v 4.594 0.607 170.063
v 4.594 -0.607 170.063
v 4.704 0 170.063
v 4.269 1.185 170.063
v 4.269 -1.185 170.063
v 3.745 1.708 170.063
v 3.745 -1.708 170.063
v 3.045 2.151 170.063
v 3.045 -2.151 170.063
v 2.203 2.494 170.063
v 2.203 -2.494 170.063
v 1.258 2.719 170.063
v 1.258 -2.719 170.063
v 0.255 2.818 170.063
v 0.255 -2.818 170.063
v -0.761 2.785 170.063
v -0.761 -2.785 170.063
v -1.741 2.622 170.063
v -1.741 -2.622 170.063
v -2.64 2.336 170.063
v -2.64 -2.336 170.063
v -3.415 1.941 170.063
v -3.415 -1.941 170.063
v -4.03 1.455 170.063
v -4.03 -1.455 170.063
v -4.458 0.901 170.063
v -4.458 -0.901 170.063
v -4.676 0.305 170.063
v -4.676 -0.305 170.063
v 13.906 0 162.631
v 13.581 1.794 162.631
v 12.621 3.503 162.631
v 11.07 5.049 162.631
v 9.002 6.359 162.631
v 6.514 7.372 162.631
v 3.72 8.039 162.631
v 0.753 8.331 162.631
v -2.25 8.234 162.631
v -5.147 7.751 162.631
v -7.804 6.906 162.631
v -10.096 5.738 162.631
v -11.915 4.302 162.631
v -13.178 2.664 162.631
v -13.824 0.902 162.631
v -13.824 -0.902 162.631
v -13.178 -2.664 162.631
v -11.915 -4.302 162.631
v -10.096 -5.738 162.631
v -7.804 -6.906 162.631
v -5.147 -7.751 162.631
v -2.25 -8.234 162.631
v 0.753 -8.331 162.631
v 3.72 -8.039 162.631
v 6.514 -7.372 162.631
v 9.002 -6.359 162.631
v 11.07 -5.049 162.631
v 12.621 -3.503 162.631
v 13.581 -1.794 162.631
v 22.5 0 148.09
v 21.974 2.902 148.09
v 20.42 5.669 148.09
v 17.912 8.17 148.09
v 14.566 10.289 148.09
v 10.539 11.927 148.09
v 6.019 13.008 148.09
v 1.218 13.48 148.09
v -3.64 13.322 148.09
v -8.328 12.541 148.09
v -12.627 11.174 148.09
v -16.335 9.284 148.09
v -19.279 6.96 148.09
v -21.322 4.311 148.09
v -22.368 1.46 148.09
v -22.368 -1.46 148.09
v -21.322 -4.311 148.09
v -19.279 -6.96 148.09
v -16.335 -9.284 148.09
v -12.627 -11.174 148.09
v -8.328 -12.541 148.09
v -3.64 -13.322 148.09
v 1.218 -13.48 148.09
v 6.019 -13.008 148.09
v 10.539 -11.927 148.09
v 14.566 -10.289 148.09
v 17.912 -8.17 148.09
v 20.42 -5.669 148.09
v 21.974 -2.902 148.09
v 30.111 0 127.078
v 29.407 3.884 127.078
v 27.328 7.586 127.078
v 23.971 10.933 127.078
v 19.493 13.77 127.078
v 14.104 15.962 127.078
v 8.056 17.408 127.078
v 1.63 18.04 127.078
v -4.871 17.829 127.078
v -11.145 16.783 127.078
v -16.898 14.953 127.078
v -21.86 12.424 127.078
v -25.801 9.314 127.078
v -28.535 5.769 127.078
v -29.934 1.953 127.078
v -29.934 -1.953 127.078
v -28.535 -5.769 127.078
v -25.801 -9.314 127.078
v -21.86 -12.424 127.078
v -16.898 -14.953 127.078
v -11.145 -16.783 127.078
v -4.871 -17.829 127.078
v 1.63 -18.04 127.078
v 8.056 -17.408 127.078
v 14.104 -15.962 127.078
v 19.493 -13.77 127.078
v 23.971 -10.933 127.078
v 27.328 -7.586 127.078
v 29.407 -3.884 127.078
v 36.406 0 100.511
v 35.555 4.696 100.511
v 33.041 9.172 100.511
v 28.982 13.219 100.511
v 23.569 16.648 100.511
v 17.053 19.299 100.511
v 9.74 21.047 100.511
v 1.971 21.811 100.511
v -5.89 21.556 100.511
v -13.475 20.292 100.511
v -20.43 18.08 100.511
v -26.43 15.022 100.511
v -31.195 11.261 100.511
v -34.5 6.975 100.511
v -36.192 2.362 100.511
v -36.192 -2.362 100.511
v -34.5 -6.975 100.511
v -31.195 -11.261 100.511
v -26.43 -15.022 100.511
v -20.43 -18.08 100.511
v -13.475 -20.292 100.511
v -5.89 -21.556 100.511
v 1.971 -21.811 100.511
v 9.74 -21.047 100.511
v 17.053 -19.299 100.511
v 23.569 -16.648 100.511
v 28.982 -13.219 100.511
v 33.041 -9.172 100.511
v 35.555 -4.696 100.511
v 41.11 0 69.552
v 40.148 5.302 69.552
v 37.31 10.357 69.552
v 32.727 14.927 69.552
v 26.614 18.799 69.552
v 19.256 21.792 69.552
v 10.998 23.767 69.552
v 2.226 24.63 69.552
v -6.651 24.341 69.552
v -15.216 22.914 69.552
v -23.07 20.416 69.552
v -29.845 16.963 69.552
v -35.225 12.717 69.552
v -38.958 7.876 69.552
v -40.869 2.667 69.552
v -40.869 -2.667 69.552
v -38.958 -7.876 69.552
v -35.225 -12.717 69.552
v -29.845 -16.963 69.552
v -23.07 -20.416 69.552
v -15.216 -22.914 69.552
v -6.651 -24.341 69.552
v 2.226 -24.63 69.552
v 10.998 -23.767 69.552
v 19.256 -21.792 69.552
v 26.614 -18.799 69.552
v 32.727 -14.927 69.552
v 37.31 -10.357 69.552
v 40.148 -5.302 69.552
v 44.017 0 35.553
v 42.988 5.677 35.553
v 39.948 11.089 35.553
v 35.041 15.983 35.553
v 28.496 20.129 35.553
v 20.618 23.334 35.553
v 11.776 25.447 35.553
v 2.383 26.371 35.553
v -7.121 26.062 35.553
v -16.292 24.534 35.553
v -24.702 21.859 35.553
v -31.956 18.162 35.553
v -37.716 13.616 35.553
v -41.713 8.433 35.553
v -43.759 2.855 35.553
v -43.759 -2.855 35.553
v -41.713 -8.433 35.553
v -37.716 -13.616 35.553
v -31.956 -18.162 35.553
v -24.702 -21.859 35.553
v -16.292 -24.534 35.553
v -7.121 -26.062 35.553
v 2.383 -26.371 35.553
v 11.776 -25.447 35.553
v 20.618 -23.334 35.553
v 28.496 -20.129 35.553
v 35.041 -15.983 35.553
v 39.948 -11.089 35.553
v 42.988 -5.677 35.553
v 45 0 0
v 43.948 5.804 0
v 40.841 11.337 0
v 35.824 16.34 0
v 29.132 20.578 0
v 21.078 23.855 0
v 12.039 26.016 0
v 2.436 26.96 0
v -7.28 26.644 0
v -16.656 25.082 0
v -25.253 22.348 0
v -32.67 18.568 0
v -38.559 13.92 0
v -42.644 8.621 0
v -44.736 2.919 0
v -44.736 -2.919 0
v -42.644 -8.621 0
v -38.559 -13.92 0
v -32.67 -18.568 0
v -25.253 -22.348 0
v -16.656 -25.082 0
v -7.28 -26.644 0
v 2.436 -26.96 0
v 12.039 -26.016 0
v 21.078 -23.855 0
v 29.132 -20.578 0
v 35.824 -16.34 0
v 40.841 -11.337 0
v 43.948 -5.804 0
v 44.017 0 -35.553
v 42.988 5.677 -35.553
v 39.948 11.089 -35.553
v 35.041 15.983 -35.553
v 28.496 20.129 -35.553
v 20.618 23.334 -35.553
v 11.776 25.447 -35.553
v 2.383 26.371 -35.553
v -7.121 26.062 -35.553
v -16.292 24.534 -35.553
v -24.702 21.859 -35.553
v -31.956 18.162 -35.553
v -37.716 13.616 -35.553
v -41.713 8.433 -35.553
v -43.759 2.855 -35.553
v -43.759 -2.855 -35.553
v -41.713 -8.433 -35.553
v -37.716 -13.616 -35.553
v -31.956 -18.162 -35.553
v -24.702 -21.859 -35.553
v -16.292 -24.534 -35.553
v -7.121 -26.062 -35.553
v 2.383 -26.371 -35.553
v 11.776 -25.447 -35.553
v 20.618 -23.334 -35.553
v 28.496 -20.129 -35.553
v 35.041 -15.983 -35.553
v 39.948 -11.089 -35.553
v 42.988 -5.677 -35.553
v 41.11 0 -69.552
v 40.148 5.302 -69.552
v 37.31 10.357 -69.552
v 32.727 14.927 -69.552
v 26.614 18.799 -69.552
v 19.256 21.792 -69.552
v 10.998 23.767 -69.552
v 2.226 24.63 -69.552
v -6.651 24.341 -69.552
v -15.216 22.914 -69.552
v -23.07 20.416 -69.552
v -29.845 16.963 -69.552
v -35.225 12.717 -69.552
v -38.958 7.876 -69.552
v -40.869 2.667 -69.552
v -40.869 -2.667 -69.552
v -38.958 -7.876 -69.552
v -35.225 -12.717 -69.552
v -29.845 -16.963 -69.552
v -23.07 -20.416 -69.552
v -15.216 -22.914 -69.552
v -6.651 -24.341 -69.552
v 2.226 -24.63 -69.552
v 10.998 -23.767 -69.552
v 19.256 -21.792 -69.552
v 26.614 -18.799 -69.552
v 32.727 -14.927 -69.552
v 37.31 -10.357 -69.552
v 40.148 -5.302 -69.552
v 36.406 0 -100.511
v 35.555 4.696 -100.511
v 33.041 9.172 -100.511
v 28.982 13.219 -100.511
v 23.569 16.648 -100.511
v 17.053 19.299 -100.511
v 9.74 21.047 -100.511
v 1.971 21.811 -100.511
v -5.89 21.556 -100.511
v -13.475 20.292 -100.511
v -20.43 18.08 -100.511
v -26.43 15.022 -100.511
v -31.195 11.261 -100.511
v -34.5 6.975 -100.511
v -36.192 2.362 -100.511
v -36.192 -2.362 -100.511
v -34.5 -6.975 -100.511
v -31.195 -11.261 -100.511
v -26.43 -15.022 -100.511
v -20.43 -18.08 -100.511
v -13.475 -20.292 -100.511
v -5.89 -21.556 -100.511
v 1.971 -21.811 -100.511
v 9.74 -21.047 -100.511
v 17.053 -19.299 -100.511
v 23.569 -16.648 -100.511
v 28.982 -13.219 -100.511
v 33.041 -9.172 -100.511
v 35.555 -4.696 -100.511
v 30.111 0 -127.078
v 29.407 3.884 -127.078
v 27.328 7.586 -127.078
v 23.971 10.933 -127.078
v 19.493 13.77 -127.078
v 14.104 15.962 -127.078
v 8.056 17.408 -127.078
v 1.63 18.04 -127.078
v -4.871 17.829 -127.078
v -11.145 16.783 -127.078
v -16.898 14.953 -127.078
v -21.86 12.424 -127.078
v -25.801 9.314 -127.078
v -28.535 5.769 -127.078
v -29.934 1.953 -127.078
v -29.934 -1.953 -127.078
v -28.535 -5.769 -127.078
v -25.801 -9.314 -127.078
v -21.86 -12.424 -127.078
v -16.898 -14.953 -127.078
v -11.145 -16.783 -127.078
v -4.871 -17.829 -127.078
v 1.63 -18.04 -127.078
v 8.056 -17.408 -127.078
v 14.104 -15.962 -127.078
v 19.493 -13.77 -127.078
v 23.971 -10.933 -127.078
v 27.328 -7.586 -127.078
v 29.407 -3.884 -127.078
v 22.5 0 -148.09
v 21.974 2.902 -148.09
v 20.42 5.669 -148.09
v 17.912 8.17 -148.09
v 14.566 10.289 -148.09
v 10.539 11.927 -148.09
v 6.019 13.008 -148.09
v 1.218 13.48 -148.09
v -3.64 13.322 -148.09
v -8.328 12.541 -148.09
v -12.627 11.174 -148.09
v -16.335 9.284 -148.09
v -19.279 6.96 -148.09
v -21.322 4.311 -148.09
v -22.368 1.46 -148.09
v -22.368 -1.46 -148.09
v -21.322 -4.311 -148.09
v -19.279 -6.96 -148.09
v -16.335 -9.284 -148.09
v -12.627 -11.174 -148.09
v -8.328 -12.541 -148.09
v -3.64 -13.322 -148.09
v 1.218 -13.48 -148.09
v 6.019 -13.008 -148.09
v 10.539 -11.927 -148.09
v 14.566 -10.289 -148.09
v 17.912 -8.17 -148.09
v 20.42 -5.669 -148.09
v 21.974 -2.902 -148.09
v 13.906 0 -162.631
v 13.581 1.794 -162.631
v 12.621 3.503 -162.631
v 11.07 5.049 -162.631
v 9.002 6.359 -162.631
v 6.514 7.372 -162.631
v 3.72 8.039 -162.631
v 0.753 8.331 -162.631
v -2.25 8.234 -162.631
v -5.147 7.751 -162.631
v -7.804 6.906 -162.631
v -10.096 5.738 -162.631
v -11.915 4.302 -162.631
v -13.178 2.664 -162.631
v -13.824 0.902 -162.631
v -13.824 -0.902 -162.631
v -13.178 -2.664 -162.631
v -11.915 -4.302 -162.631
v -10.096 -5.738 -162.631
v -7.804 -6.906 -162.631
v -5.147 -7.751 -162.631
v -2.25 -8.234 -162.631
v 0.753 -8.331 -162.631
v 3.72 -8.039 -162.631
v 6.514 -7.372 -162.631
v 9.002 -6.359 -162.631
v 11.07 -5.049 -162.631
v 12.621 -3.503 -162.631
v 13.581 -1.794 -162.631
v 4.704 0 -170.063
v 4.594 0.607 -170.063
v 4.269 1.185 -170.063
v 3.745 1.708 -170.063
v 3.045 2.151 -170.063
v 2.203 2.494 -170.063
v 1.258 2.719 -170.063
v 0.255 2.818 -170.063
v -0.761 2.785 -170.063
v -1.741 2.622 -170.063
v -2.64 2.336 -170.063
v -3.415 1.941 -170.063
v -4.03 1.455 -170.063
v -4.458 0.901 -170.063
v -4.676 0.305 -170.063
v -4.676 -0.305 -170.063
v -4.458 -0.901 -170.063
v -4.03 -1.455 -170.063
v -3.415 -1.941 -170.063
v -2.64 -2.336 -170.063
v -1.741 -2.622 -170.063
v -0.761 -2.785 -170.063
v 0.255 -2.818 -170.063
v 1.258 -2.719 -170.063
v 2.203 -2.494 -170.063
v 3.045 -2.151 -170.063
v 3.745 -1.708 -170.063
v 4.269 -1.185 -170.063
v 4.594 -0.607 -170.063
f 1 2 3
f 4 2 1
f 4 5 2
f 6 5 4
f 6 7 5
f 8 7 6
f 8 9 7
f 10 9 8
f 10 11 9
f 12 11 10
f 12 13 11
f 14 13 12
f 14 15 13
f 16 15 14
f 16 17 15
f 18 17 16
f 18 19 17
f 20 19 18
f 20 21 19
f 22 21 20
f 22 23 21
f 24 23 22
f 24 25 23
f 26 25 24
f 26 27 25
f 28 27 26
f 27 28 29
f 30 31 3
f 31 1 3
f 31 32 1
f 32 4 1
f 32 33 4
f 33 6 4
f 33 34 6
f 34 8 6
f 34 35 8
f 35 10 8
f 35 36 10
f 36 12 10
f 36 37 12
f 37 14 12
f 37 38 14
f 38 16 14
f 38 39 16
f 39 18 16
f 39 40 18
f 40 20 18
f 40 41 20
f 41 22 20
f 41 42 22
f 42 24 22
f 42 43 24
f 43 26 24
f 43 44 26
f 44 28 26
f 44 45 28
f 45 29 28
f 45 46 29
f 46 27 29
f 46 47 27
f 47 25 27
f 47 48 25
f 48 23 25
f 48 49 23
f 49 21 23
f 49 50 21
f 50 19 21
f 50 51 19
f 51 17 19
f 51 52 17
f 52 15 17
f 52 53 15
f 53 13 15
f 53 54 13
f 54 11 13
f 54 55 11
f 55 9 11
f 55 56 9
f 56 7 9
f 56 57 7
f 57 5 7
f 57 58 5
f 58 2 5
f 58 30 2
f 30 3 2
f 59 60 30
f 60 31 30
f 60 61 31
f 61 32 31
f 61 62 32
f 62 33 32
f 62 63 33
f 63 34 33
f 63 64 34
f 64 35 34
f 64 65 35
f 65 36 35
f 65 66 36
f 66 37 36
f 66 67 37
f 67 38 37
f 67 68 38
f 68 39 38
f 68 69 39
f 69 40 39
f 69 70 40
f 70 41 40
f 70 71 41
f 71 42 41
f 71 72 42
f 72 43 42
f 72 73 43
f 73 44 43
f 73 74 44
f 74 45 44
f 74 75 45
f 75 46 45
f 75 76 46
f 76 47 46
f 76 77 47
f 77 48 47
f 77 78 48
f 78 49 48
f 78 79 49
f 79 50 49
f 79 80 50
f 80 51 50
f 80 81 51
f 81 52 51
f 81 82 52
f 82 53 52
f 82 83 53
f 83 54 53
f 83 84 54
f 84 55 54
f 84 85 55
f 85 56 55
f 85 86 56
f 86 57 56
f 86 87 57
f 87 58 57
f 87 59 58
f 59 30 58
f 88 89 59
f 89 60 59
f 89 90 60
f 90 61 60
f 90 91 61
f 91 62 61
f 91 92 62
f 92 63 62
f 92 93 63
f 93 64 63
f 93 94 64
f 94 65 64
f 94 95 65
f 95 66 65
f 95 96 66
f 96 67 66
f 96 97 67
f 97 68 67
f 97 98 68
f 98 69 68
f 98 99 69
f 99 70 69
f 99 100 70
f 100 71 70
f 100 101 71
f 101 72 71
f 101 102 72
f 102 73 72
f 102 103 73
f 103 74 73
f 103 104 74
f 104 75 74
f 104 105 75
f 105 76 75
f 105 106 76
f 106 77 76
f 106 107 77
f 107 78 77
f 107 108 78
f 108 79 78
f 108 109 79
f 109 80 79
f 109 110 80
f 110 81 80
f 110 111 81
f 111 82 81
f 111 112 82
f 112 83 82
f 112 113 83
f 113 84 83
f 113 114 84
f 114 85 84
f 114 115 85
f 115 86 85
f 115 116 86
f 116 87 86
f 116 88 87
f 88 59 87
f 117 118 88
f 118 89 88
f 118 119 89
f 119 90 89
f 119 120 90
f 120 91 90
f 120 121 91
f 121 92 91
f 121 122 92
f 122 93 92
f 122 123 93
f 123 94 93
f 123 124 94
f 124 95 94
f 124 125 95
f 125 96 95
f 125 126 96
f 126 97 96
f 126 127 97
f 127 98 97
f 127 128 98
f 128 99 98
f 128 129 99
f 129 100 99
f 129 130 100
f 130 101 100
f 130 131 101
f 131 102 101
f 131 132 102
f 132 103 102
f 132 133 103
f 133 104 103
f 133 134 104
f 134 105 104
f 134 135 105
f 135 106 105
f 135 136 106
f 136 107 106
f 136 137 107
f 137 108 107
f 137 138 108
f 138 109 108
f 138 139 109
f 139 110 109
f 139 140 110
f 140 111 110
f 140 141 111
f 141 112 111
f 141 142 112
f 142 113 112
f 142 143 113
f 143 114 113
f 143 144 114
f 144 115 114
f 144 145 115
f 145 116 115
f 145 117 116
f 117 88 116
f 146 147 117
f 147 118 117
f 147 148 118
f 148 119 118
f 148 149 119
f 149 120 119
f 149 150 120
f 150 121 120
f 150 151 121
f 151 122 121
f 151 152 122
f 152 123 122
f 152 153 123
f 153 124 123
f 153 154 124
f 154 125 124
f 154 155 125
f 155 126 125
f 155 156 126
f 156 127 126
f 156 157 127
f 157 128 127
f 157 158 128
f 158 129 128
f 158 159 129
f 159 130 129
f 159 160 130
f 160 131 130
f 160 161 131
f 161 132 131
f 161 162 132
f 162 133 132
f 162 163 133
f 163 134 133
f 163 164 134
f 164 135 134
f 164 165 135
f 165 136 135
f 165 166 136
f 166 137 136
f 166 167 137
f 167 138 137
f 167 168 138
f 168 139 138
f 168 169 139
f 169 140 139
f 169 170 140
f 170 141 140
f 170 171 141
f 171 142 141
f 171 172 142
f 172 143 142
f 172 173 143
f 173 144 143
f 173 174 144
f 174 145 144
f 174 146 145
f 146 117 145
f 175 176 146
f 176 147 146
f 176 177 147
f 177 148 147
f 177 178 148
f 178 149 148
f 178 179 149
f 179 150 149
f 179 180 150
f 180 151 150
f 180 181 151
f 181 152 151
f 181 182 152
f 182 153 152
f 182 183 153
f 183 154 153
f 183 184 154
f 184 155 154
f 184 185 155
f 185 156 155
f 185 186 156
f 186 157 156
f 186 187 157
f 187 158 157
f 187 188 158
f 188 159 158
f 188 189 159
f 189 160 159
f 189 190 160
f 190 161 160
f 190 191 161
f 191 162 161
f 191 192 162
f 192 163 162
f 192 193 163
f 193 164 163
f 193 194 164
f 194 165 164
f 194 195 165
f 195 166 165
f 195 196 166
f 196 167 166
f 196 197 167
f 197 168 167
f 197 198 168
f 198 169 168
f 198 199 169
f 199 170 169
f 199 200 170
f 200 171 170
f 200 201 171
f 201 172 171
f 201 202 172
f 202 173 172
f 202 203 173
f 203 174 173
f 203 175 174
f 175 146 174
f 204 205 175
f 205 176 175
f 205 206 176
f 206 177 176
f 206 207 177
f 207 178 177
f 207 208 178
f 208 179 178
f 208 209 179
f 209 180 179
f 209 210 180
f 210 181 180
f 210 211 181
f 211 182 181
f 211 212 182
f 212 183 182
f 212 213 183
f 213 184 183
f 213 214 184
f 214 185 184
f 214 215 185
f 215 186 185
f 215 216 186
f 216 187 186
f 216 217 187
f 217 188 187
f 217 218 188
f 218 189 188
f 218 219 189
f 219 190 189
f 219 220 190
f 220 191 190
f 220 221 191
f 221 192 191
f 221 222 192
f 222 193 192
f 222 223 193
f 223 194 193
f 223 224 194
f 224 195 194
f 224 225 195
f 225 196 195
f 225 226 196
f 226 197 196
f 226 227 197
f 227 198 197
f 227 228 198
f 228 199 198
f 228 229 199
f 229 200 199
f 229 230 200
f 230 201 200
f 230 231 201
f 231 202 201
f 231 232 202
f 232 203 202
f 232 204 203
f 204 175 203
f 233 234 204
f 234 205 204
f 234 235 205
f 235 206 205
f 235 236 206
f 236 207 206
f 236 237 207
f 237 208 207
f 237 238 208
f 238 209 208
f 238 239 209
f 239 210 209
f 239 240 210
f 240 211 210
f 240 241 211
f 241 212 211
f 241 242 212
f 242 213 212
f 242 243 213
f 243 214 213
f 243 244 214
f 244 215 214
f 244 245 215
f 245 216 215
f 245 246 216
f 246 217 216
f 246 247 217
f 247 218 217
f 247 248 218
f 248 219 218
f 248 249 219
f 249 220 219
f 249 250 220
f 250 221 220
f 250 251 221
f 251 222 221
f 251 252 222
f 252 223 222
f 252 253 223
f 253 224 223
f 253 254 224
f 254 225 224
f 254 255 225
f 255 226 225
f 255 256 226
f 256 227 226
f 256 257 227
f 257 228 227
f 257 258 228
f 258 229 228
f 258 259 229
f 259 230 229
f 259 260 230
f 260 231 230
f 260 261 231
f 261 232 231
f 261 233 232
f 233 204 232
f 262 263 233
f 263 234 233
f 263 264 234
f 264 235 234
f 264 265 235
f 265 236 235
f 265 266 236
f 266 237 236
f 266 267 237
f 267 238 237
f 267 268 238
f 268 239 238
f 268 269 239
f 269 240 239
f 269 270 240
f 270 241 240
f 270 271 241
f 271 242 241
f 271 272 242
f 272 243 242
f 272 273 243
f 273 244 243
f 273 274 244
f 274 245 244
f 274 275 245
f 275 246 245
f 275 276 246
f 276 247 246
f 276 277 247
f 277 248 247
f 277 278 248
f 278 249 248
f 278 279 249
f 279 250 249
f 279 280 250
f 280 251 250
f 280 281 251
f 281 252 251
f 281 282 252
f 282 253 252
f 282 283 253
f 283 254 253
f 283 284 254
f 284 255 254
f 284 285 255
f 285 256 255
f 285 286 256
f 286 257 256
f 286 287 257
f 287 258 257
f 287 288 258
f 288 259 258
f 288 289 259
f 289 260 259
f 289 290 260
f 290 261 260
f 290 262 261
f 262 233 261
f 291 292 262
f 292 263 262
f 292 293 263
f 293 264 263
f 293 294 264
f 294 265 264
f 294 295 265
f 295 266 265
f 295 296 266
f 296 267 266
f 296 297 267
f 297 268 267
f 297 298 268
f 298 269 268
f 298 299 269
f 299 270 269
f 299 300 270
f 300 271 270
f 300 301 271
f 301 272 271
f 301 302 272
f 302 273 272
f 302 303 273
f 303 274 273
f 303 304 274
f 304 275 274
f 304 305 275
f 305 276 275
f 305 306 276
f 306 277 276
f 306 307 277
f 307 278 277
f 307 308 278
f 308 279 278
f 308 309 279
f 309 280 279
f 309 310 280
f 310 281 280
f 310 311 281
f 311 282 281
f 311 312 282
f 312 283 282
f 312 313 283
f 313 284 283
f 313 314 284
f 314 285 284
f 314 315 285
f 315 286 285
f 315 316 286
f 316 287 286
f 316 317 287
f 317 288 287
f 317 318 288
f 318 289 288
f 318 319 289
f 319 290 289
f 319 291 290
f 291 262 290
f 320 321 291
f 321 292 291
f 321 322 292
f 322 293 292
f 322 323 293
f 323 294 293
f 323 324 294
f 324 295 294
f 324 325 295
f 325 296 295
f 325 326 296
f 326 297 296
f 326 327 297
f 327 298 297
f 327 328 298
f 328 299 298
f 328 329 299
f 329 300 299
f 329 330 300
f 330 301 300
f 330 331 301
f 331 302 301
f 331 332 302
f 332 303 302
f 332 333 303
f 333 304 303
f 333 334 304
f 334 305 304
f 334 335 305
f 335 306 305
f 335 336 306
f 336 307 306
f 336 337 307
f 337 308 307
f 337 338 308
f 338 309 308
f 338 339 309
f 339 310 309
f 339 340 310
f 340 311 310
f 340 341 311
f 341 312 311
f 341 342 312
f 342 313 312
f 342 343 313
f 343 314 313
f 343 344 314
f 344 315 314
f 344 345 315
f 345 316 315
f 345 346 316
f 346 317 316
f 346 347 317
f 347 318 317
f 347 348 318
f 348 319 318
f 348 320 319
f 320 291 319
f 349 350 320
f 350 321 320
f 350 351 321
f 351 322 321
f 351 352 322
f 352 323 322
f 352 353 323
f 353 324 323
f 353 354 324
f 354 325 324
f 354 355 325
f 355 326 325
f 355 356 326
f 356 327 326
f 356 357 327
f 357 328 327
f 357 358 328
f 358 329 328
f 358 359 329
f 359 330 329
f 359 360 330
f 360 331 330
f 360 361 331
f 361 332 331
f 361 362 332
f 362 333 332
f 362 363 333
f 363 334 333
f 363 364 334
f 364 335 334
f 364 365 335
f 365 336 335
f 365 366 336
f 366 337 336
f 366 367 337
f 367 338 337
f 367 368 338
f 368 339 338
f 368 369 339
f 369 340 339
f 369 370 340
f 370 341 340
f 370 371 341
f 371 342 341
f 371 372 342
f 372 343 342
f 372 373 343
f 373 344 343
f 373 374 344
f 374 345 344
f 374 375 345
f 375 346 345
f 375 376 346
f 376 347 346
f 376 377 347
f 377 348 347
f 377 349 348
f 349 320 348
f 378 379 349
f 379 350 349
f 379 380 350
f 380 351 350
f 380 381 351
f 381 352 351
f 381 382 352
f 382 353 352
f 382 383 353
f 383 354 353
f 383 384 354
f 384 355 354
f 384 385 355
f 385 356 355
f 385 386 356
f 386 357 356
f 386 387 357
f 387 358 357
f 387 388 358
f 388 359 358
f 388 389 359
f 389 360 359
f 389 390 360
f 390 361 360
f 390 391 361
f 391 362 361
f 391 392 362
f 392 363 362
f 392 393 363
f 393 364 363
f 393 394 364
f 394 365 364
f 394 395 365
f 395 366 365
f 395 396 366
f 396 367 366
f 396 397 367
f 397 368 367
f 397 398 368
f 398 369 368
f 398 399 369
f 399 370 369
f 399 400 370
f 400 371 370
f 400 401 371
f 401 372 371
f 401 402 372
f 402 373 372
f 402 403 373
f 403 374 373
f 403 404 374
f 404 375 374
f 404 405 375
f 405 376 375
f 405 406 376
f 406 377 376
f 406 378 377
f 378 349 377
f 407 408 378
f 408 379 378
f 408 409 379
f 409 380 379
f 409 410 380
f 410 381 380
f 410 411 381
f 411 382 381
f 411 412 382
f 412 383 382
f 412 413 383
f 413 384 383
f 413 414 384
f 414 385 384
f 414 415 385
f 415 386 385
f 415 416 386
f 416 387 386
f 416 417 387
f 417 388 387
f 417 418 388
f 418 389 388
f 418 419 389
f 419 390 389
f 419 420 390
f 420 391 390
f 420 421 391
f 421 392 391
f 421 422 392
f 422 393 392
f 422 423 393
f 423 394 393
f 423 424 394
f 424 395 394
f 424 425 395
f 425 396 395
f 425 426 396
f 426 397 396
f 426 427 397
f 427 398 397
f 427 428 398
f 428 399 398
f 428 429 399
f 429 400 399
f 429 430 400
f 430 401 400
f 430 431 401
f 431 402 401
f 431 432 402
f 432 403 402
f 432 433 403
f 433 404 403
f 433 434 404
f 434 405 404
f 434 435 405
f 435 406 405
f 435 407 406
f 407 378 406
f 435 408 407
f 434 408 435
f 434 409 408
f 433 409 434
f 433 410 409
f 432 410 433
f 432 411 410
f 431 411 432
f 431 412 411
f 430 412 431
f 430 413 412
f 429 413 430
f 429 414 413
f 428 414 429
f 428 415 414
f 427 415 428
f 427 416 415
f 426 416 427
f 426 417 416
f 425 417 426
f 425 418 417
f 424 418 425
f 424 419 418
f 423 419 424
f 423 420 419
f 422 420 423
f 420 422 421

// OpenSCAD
// Generated by SolidPython 1.0.1 on 2020-07-29 00:46:46


scale(v = [5, 3, 19]) {
	sphere(r = 9);
}
/***********************************************
*********      SolidPython code:      **********
************************************************
 
# import packages: SolidPython
from solid import *
from solid.utils import *
from itertools import chain, combinations, permutations


class Resize:

    def __init__(self, scad_file):
        self.scad_file = scad_file
        #self.scad_file = import_scad(scad_file)
        # cone/cylinder param:
        self.r1 = 0
        self.r2 = 0
        self.h = 0
        # rectangular prism param:
        self.w = 0
        self.l = 0
        # ellipse param:
        self.r = 0

    # import OpenScad code (file name corresponds to shape)


    # classify shape + parameters
    def assign(self, param1, param2, param3):
        if self.scad_file == 'cone.scad':
            self.r1 = param1
            self.r2 = param2
            self.h = param3
        elif self.scad_file == 'cylinder.scad':
            self.r1 = param1
            self.r2 = param2
            self.h = param3
        elif self.scad_file == 'rectangularPrism.scad':
            self.h = param1
            self.l = param2
            self.w = param3
        else:
            self.r = param1
            self.h = param2

    # resize parameters
    def iterate(self):
        x = range(3, 20, 2)
        i = 1
        if self.scad_file == 'cone.scad':
            tempList = list(permutations(x, 2))
            for temp in tempList:
                param1 = temp[0]
                param2 = temp[1]
                filepath = 'produced_scad_files/' + 'cone' + str(param1) + '_' + str(param2) + '_' + '.scad'
                scad_render_to_file(cylinder(h=param1, r1=param2, r2=0), filepath)

        elif self.scad_file == 'cylinder.scad':
            tempList = list(permutations(x, 3))
            for temp in tempList:
                param1 = temp[0]
                param2 = temp[1]
                filepath = 'produced_scad_files/' + 'cylinder' + str(param1) + '_' + str(param2) + '_' + '.scad'
                scad_render_to_file(cylinder(h=param1, r1=param2, r2=param2), filepath)

        elif self.scad_file == 'rectangularPrism.scad':
            tempList = list(permutations(x, 3))
            for temp in tempList:
                param1 = temp[0]
                param2 = temp[1]
                param3 = temp[2]
                filepath = 'produced_scad_files/' + 'rectangularPrism' + str(param1) + '_' + str(param2) + '_' + str(
                    param3) + '.scad'
                scad_render_to_file(cube(size=(param1, param2, param3)), filepath)

        elif self.scad_file == 'ellipse.scad':
            tempList = list(permutations(x, 4))
            for temp in tempList:
                param1 = temp[0]
                param2 = temp[1]
                param3 = temp[2]
                param4 = temp[3]
                filepath = 'produced_scad_files/' + 'ellipse' + str(param1) + '_' + str(param2) + '_' + str(param3) + '_' + str(param4) + '.scad'
                scad_render_to_file(scale([param1, param2, param3])(sphere(r=param4)), filepath)

    def render_to_scadfile(self):
        scad_render_to_file(scad, 'example.scad') 
 
************************************************/
